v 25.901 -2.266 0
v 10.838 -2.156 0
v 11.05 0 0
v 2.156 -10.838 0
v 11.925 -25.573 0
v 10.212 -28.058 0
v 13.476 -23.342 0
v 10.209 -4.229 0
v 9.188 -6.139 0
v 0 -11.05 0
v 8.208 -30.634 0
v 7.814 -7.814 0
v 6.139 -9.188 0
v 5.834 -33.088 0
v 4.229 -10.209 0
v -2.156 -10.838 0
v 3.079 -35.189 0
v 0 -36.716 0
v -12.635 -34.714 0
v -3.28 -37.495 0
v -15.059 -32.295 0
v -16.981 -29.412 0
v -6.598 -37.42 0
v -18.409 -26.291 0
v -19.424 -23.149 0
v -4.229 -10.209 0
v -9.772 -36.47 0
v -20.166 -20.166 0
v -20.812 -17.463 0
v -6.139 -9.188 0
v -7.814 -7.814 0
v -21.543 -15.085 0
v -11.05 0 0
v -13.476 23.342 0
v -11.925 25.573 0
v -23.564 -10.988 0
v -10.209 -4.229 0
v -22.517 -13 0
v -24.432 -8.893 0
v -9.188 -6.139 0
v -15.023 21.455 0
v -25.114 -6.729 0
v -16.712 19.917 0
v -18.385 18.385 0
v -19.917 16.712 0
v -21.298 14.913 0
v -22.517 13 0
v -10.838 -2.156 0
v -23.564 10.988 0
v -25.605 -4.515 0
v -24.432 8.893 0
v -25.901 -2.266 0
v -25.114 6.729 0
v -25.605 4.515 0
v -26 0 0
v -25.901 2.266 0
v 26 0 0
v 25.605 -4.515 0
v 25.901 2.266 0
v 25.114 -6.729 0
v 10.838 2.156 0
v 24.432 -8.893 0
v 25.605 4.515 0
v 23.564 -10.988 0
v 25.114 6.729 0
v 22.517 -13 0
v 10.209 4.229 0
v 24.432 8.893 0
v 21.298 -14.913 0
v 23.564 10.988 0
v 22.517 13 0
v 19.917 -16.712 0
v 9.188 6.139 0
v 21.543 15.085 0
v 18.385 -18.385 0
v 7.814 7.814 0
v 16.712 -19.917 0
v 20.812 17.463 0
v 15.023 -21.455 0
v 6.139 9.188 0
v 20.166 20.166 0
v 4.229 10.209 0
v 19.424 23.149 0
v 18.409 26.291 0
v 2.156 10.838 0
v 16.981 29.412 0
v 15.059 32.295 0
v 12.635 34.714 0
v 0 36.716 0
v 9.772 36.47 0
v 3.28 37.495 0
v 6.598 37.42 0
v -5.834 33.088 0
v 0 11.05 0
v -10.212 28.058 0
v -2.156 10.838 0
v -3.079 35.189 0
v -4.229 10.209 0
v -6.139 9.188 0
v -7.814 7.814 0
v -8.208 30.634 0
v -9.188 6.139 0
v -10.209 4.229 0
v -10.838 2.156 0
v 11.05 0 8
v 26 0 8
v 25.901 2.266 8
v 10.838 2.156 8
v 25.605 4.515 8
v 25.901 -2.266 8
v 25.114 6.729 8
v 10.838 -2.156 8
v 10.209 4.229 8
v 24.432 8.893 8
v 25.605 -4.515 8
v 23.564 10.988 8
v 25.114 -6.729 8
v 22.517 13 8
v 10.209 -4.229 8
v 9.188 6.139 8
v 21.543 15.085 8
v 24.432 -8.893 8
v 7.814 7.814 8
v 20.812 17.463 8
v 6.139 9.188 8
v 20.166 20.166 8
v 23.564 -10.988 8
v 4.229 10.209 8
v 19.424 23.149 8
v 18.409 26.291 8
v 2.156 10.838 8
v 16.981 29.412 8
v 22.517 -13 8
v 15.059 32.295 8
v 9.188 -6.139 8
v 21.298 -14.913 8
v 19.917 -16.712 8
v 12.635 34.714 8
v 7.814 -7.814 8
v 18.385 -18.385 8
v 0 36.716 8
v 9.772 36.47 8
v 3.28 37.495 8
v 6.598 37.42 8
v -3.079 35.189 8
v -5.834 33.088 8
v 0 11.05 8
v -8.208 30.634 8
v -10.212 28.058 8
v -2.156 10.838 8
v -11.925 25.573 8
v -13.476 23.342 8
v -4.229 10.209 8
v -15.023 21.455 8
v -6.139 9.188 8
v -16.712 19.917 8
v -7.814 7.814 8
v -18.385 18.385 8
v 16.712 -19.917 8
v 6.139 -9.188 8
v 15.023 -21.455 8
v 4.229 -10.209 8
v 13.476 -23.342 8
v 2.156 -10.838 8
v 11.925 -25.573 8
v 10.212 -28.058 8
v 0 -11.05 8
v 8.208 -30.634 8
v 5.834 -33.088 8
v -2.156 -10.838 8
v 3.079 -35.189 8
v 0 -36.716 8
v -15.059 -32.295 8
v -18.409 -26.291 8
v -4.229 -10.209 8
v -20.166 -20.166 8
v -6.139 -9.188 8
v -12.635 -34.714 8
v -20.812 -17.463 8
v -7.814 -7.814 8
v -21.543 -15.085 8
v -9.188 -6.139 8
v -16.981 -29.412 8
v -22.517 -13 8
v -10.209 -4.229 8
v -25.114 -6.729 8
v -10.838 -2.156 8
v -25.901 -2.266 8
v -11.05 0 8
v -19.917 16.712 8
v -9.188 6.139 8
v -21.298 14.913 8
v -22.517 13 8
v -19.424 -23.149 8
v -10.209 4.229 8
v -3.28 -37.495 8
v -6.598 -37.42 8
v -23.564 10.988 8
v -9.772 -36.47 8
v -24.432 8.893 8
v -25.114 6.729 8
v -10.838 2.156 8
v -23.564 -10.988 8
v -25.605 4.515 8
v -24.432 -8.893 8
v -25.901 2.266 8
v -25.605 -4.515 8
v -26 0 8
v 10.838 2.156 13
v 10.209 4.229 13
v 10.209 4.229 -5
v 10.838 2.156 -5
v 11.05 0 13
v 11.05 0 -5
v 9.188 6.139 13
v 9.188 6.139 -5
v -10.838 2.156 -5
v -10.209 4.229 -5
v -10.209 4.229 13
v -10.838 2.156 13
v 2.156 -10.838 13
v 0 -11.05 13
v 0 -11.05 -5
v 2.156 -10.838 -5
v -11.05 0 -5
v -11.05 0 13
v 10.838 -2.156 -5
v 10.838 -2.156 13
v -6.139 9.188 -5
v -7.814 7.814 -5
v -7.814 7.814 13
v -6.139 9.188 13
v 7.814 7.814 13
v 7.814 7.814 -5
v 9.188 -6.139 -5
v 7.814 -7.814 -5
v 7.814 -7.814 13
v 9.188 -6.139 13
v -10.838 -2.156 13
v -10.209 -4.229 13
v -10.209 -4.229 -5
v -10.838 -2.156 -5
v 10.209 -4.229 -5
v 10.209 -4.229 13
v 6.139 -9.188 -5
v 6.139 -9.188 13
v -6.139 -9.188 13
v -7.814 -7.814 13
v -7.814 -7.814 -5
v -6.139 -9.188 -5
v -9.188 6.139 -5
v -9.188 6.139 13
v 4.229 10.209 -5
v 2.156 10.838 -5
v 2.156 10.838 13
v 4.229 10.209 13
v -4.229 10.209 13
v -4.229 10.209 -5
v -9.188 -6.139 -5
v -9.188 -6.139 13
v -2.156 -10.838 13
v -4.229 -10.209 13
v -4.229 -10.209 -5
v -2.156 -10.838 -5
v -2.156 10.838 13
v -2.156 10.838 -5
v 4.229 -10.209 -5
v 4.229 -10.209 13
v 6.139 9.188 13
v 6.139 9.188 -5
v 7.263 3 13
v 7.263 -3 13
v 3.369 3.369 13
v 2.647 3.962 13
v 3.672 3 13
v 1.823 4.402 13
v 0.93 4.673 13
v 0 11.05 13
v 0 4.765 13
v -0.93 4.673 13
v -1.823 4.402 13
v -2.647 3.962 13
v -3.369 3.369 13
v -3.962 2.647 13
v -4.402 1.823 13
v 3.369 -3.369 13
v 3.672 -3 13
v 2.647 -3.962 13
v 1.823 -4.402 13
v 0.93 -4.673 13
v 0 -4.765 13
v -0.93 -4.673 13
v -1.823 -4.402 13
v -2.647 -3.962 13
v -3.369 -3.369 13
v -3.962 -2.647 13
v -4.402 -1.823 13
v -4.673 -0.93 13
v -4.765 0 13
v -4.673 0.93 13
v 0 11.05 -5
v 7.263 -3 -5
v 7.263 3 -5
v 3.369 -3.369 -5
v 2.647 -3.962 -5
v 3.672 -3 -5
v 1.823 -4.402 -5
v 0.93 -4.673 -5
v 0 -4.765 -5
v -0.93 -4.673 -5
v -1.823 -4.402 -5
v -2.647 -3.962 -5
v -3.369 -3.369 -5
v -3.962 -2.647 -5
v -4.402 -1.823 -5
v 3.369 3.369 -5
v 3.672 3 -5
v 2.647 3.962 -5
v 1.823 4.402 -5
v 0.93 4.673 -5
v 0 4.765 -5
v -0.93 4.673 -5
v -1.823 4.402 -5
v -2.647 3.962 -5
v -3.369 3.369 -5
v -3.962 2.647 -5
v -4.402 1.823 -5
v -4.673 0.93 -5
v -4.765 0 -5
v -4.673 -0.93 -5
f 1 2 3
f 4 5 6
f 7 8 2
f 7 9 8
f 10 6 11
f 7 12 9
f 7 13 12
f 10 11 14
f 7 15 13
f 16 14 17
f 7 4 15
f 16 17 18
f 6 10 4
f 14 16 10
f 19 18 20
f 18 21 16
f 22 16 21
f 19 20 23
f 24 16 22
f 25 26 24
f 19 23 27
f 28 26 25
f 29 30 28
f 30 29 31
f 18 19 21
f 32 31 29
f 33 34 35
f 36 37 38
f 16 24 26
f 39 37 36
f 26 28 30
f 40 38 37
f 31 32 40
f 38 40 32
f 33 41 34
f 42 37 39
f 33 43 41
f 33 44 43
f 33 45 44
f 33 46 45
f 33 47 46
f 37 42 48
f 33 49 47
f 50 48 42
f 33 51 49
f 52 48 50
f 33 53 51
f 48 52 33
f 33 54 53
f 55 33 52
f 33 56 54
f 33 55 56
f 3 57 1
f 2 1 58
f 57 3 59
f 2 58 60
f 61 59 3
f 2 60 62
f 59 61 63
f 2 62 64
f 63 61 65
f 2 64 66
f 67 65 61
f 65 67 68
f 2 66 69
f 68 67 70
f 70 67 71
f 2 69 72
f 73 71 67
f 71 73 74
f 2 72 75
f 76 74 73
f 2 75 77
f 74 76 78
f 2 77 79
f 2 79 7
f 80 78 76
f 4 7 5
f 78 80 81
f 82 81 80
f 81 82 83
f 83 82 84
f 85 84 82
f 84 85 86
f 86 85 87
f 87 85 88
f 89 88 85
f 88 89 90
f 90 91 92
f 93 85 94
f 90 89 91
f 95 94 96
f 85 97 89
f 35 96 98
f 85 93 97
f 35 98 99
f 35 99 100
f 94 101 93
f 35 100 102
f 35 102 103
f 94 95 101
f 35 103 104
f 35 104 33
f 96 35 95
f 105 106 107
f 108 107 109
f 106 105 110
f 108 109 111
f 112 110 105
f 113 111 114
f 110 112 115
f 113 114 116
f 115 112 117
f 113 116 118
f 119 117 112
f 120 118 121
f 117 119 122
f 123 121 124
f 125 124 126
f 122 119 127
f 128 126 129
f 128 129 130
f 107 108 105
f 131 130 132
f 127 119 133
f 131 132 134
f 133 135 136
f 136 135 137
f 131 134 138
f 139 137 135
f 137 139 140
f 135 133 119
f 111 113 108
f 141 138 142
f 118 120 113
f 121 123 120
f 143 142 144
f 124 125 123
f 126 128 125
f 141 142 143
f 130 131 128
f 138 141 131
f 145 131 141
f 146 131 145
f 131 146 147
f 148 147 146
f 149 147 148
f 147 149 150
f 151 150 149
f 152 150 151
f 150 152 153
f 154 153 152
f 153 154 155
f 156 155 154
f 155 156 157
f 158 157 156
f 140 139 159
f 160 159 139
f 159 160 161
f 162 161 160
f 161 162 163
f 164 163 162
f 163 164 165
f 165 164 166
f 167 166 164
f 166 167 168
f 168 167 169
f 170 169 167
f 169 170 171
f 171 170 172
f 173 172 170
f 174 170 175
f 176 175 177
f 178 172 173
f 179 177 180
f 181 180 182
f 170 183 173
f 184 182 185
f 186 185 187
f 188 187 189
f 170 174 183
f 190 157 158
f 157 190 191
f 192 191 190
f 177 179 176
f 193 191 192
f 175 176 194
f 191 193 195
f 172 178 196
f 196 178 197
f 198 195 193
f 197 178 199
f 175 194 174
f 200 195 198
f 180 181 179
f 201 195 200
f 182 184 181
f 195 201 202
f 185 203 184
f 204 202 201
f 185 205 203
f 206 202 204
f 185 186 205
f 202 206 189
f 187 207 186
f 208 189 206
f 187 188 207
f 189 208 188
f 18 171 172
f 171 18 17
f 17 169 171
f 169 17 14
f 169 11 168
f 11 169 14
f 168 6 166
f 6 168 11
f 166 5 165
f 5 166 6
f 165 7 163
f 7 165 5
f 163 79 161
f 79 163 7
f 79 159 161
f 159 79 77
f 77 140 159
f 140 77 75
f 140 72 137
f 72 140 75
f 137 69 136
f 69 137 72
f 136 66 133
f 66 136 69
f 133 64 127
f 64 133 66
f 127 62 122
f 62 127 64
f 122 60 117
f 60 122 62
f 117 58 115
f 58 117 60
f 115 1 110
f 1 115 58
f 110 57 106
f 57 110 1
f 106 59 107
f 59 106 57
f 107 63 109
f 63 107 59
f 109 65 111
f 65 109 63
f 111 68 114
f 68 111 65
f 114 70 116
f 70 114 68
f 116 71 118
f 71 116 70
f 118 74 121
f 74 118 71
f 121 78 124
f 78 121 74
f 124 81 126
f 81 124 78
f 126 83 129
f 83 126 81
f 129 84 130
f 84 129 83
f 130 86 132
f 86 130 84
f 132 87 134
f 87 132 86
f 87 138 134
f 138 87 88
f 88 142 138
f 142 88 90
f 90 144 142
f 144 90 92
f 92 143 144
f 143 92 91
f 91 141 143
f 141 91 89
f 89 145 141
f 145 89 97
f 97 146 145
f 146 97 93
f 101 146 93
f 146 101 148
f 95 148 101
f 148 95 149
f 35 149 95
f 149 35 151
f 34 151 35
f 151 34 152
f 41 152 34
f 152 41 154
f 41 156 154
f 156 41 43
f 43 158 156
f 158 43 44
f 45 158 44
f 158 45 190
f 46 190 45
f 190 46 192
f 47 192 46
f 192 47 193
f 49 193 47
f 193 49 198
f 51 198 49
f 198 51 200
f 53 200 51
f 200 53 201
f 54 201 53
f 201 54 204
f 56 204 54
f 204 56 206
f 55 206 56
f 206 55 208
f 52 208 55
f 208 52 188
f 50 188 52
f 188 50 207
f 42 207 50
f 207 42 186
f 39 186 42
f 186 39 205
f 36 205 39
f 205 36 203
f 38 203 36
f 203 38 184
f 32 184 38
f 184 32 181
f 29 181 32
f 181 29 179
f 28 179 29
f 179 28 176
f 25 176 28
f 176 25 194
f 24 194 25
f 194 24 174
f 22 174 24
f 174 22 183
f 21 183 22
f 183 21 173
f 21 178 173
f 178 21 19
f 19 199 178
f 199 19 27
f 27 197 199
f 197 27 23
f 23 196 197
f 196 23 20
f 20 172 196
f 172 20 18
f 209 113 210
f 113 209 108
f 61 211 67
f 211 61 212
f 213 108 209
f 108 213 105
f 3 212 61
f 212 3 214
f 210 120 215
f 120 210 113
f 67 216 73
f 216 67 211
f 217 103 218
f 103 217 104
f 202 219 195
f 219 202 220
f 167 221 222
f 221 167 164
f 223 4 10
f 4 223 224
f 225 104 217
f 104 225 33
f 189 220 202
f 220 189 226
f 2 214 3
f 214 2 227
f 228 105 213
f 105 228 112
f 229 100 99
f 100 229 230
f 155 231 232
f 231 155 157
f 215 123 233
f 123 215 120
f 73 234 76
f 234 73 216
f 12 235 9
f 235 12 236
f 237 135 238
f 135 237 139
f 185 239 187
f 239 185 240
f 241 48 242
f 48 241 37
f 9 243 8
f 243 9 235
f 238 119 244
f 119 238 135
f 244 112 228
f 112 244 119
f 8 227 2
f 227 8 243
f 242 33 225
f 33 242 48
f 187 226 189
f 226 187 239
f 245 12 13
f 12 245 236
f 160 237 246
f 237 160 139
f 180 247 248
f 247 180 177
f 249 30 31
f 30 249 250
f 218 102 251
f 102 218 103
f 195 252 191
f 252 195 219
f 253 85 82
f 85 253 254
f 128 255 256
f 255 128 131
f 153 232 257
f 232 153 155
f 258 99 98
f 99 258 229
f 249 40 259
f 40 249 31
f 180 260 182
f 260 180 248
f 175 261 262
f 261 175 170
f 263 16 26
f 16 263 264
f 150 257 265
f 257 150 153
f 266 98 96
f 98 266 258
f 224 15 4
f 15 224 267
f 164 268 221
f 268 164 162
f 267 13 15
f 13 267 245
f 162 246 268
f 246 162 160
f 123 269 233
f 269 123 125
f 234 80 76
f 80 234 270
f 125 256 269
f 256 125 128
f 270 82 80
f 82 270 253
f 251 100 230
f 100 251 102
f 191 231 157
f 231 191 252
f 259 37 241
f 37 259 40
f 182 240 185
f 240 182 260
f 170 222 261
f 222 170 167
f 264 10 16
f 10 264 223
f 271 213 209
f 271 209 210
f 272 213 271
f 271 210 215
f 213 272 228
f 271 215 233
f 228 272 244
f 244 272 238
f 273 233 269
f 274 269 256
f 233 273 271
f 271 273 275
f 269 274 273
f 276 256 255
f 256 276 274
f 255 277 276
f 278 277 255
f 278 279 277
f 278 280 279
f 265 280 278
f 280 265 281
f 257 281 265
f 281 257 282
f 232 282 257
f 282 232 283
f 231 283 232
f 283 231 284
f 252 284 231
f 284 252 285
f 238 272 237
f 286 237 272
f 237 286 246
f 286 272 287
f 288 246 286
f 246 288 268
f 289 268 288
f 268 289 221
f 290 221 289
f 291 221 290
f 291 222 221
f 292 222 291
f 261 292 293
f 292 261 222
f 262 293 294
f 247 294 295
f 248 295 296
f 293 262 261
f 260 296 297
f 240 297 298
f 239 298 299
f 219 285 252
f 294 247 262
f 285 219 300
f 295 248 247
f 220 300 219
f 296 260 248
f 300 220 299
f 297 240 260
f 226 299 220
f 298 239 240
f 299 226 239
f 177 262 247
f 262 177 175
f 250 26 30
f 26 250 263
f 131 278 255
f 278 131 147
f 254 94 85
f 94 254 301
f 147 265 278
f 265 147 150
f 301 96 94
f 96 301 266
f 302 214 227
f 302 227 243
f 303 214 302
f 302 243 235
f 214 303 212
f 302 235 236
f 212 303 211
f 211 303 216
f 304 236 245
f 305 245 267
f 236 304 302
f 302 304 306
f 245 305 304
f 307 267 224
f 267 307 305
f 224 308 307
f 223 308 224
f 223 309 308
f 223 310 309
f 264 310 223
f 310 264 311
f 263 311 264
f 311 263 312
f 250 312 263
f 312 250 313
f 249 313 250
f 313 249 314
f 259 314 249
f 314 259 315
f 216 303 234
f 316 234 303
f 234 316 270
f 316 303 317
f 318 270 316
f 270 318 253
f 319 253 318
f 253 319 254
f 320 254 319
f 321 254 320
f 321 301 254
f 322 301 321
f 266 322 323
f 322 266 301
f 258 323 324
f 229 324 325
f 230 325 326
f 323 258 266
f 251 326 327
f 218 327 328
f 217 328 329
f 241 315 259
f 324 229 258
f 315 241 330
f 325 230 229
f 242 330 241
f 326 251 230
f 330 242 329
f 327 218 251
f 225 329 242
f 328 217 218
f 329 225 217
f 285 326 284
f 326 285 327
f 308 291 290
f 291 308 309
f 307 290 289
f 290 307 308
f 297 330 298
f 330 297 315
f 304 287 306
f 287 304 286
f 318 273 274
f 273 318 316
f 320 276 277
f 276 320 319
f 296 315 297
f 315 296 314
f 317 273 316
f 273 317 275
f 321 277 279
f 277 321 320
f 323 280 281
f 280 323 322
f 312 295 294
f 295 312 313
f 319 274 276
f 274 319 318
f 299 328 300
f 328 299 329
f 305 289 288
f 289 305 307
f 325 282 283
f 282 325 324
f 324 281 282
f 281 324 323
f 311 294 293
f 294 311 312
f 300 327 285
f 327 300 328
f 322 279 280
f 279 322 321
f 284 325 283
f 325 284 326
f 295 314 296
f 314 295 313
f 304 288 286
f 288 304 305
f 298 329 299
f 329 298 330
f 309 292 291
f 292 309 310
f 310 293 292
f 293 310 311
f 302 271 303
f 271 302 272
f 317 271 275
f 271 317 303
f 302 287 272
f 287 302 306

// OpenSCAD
$fn = 32;

// ----------------------------------------------------------------------
// Cam: base radius 26 mm with a 12 mm lift over 180 degrees
// ----------------------------------------------------------------------

// --- parameters (mm) ---
base_r = 26;              // base radius
lift = 12;                // lift height above the base radius
lift_span = 180;          // angular width of the lift
lift_start = 30;          // angle where the lift starts
cam_t = 8;                // cam plate thickness
hub_d = 22.1;             // hub diameter
hub_h = 18;               // hub height
bore_d = 9.53;            // bore
key_w = 6;                // keyway width
key_depth = 3;            // keyway depth

cam_profile = [[26, 0], [25.901, 2.266], [25.605, 4.515], [25.114, 6.729], [24.432, 8.893], [23.564, 10.988], [22.517, 13], [21.543, 15.085], [20.812, 17.463], [20.166, 20.166], [19.424, 23.149], [18.409, 26.291], [16.981, 29.412], [15.059, 32.295], [12.635, 34.714], [9.772, 36.47], [6.598, 37.42], [3.28, 37.495], [0, 36.716], [-3.079, 35.189], [-5.834, 33.088], [-8.208, 30.634], [-10.212, 28.058], [-11.925, 25.573], [-13.476, 23.342], [-15.023, 21.455], [-16.712, 19.917], [-18.385, 18.385], [-19.917, 16.712], [-21.298, 14.913], [-22.517, 13], [-23.564, 10.988], [-24.432, 8.893], [-25.114, 6.729], [-25.605, 4.515], [-25.901, 2.266], [-26, 0], [-25.901, -2.266], [-25.605, -4.515], [-25.114, -6.729], [-24.432, -8.893], [-23.564, -10.988], [-22.517, -13], [-21.543, -15.085], [-20.812, -17.463], [-20.166, -20.166], [-19.424, -23.149], [-18.409, -26.291], [-16.981, -29.412], [-15.059, -32.295], [-12.635, -34.714], [-9.772, -36.47], [-6.598, -37.42], [-3.28, -37.495], [0, -36.716], [3.079, -35.189], [5.834, -33.088], [8.208, -30.634], [10.212, -28.058], [11.925, -25.573], [13.476, -23.342], [15.023, -21.455], [16.712, -19.917], [18.385, -18.385], [19.917, -16.712], [21.298, -14.913], [22.517, -13], [23.564, -10.988], [24.432, -8.893], [25.114, -6.729], [25.605, -4.515], [25.901, -2.266]];

difference() {
  union() {
    linear_extrude(height = cam_t) polygon(cam_profile);
    /* hub, proud of the cam plate on both sides */
    translate([0, 0, -5]) cylinder(h = hub_h, d = hub_d);
  }
  /* bore through the hub, 2.5 mm clear on both faces */
  translate([0, 0, -7.5]) cylinder(h = hub_h + 5, d = bore_d);
  /* keyway, milled through the whole hub */
  translate([1.763, -3, -7.5]) cube([5.5, 6, 23]);
}
